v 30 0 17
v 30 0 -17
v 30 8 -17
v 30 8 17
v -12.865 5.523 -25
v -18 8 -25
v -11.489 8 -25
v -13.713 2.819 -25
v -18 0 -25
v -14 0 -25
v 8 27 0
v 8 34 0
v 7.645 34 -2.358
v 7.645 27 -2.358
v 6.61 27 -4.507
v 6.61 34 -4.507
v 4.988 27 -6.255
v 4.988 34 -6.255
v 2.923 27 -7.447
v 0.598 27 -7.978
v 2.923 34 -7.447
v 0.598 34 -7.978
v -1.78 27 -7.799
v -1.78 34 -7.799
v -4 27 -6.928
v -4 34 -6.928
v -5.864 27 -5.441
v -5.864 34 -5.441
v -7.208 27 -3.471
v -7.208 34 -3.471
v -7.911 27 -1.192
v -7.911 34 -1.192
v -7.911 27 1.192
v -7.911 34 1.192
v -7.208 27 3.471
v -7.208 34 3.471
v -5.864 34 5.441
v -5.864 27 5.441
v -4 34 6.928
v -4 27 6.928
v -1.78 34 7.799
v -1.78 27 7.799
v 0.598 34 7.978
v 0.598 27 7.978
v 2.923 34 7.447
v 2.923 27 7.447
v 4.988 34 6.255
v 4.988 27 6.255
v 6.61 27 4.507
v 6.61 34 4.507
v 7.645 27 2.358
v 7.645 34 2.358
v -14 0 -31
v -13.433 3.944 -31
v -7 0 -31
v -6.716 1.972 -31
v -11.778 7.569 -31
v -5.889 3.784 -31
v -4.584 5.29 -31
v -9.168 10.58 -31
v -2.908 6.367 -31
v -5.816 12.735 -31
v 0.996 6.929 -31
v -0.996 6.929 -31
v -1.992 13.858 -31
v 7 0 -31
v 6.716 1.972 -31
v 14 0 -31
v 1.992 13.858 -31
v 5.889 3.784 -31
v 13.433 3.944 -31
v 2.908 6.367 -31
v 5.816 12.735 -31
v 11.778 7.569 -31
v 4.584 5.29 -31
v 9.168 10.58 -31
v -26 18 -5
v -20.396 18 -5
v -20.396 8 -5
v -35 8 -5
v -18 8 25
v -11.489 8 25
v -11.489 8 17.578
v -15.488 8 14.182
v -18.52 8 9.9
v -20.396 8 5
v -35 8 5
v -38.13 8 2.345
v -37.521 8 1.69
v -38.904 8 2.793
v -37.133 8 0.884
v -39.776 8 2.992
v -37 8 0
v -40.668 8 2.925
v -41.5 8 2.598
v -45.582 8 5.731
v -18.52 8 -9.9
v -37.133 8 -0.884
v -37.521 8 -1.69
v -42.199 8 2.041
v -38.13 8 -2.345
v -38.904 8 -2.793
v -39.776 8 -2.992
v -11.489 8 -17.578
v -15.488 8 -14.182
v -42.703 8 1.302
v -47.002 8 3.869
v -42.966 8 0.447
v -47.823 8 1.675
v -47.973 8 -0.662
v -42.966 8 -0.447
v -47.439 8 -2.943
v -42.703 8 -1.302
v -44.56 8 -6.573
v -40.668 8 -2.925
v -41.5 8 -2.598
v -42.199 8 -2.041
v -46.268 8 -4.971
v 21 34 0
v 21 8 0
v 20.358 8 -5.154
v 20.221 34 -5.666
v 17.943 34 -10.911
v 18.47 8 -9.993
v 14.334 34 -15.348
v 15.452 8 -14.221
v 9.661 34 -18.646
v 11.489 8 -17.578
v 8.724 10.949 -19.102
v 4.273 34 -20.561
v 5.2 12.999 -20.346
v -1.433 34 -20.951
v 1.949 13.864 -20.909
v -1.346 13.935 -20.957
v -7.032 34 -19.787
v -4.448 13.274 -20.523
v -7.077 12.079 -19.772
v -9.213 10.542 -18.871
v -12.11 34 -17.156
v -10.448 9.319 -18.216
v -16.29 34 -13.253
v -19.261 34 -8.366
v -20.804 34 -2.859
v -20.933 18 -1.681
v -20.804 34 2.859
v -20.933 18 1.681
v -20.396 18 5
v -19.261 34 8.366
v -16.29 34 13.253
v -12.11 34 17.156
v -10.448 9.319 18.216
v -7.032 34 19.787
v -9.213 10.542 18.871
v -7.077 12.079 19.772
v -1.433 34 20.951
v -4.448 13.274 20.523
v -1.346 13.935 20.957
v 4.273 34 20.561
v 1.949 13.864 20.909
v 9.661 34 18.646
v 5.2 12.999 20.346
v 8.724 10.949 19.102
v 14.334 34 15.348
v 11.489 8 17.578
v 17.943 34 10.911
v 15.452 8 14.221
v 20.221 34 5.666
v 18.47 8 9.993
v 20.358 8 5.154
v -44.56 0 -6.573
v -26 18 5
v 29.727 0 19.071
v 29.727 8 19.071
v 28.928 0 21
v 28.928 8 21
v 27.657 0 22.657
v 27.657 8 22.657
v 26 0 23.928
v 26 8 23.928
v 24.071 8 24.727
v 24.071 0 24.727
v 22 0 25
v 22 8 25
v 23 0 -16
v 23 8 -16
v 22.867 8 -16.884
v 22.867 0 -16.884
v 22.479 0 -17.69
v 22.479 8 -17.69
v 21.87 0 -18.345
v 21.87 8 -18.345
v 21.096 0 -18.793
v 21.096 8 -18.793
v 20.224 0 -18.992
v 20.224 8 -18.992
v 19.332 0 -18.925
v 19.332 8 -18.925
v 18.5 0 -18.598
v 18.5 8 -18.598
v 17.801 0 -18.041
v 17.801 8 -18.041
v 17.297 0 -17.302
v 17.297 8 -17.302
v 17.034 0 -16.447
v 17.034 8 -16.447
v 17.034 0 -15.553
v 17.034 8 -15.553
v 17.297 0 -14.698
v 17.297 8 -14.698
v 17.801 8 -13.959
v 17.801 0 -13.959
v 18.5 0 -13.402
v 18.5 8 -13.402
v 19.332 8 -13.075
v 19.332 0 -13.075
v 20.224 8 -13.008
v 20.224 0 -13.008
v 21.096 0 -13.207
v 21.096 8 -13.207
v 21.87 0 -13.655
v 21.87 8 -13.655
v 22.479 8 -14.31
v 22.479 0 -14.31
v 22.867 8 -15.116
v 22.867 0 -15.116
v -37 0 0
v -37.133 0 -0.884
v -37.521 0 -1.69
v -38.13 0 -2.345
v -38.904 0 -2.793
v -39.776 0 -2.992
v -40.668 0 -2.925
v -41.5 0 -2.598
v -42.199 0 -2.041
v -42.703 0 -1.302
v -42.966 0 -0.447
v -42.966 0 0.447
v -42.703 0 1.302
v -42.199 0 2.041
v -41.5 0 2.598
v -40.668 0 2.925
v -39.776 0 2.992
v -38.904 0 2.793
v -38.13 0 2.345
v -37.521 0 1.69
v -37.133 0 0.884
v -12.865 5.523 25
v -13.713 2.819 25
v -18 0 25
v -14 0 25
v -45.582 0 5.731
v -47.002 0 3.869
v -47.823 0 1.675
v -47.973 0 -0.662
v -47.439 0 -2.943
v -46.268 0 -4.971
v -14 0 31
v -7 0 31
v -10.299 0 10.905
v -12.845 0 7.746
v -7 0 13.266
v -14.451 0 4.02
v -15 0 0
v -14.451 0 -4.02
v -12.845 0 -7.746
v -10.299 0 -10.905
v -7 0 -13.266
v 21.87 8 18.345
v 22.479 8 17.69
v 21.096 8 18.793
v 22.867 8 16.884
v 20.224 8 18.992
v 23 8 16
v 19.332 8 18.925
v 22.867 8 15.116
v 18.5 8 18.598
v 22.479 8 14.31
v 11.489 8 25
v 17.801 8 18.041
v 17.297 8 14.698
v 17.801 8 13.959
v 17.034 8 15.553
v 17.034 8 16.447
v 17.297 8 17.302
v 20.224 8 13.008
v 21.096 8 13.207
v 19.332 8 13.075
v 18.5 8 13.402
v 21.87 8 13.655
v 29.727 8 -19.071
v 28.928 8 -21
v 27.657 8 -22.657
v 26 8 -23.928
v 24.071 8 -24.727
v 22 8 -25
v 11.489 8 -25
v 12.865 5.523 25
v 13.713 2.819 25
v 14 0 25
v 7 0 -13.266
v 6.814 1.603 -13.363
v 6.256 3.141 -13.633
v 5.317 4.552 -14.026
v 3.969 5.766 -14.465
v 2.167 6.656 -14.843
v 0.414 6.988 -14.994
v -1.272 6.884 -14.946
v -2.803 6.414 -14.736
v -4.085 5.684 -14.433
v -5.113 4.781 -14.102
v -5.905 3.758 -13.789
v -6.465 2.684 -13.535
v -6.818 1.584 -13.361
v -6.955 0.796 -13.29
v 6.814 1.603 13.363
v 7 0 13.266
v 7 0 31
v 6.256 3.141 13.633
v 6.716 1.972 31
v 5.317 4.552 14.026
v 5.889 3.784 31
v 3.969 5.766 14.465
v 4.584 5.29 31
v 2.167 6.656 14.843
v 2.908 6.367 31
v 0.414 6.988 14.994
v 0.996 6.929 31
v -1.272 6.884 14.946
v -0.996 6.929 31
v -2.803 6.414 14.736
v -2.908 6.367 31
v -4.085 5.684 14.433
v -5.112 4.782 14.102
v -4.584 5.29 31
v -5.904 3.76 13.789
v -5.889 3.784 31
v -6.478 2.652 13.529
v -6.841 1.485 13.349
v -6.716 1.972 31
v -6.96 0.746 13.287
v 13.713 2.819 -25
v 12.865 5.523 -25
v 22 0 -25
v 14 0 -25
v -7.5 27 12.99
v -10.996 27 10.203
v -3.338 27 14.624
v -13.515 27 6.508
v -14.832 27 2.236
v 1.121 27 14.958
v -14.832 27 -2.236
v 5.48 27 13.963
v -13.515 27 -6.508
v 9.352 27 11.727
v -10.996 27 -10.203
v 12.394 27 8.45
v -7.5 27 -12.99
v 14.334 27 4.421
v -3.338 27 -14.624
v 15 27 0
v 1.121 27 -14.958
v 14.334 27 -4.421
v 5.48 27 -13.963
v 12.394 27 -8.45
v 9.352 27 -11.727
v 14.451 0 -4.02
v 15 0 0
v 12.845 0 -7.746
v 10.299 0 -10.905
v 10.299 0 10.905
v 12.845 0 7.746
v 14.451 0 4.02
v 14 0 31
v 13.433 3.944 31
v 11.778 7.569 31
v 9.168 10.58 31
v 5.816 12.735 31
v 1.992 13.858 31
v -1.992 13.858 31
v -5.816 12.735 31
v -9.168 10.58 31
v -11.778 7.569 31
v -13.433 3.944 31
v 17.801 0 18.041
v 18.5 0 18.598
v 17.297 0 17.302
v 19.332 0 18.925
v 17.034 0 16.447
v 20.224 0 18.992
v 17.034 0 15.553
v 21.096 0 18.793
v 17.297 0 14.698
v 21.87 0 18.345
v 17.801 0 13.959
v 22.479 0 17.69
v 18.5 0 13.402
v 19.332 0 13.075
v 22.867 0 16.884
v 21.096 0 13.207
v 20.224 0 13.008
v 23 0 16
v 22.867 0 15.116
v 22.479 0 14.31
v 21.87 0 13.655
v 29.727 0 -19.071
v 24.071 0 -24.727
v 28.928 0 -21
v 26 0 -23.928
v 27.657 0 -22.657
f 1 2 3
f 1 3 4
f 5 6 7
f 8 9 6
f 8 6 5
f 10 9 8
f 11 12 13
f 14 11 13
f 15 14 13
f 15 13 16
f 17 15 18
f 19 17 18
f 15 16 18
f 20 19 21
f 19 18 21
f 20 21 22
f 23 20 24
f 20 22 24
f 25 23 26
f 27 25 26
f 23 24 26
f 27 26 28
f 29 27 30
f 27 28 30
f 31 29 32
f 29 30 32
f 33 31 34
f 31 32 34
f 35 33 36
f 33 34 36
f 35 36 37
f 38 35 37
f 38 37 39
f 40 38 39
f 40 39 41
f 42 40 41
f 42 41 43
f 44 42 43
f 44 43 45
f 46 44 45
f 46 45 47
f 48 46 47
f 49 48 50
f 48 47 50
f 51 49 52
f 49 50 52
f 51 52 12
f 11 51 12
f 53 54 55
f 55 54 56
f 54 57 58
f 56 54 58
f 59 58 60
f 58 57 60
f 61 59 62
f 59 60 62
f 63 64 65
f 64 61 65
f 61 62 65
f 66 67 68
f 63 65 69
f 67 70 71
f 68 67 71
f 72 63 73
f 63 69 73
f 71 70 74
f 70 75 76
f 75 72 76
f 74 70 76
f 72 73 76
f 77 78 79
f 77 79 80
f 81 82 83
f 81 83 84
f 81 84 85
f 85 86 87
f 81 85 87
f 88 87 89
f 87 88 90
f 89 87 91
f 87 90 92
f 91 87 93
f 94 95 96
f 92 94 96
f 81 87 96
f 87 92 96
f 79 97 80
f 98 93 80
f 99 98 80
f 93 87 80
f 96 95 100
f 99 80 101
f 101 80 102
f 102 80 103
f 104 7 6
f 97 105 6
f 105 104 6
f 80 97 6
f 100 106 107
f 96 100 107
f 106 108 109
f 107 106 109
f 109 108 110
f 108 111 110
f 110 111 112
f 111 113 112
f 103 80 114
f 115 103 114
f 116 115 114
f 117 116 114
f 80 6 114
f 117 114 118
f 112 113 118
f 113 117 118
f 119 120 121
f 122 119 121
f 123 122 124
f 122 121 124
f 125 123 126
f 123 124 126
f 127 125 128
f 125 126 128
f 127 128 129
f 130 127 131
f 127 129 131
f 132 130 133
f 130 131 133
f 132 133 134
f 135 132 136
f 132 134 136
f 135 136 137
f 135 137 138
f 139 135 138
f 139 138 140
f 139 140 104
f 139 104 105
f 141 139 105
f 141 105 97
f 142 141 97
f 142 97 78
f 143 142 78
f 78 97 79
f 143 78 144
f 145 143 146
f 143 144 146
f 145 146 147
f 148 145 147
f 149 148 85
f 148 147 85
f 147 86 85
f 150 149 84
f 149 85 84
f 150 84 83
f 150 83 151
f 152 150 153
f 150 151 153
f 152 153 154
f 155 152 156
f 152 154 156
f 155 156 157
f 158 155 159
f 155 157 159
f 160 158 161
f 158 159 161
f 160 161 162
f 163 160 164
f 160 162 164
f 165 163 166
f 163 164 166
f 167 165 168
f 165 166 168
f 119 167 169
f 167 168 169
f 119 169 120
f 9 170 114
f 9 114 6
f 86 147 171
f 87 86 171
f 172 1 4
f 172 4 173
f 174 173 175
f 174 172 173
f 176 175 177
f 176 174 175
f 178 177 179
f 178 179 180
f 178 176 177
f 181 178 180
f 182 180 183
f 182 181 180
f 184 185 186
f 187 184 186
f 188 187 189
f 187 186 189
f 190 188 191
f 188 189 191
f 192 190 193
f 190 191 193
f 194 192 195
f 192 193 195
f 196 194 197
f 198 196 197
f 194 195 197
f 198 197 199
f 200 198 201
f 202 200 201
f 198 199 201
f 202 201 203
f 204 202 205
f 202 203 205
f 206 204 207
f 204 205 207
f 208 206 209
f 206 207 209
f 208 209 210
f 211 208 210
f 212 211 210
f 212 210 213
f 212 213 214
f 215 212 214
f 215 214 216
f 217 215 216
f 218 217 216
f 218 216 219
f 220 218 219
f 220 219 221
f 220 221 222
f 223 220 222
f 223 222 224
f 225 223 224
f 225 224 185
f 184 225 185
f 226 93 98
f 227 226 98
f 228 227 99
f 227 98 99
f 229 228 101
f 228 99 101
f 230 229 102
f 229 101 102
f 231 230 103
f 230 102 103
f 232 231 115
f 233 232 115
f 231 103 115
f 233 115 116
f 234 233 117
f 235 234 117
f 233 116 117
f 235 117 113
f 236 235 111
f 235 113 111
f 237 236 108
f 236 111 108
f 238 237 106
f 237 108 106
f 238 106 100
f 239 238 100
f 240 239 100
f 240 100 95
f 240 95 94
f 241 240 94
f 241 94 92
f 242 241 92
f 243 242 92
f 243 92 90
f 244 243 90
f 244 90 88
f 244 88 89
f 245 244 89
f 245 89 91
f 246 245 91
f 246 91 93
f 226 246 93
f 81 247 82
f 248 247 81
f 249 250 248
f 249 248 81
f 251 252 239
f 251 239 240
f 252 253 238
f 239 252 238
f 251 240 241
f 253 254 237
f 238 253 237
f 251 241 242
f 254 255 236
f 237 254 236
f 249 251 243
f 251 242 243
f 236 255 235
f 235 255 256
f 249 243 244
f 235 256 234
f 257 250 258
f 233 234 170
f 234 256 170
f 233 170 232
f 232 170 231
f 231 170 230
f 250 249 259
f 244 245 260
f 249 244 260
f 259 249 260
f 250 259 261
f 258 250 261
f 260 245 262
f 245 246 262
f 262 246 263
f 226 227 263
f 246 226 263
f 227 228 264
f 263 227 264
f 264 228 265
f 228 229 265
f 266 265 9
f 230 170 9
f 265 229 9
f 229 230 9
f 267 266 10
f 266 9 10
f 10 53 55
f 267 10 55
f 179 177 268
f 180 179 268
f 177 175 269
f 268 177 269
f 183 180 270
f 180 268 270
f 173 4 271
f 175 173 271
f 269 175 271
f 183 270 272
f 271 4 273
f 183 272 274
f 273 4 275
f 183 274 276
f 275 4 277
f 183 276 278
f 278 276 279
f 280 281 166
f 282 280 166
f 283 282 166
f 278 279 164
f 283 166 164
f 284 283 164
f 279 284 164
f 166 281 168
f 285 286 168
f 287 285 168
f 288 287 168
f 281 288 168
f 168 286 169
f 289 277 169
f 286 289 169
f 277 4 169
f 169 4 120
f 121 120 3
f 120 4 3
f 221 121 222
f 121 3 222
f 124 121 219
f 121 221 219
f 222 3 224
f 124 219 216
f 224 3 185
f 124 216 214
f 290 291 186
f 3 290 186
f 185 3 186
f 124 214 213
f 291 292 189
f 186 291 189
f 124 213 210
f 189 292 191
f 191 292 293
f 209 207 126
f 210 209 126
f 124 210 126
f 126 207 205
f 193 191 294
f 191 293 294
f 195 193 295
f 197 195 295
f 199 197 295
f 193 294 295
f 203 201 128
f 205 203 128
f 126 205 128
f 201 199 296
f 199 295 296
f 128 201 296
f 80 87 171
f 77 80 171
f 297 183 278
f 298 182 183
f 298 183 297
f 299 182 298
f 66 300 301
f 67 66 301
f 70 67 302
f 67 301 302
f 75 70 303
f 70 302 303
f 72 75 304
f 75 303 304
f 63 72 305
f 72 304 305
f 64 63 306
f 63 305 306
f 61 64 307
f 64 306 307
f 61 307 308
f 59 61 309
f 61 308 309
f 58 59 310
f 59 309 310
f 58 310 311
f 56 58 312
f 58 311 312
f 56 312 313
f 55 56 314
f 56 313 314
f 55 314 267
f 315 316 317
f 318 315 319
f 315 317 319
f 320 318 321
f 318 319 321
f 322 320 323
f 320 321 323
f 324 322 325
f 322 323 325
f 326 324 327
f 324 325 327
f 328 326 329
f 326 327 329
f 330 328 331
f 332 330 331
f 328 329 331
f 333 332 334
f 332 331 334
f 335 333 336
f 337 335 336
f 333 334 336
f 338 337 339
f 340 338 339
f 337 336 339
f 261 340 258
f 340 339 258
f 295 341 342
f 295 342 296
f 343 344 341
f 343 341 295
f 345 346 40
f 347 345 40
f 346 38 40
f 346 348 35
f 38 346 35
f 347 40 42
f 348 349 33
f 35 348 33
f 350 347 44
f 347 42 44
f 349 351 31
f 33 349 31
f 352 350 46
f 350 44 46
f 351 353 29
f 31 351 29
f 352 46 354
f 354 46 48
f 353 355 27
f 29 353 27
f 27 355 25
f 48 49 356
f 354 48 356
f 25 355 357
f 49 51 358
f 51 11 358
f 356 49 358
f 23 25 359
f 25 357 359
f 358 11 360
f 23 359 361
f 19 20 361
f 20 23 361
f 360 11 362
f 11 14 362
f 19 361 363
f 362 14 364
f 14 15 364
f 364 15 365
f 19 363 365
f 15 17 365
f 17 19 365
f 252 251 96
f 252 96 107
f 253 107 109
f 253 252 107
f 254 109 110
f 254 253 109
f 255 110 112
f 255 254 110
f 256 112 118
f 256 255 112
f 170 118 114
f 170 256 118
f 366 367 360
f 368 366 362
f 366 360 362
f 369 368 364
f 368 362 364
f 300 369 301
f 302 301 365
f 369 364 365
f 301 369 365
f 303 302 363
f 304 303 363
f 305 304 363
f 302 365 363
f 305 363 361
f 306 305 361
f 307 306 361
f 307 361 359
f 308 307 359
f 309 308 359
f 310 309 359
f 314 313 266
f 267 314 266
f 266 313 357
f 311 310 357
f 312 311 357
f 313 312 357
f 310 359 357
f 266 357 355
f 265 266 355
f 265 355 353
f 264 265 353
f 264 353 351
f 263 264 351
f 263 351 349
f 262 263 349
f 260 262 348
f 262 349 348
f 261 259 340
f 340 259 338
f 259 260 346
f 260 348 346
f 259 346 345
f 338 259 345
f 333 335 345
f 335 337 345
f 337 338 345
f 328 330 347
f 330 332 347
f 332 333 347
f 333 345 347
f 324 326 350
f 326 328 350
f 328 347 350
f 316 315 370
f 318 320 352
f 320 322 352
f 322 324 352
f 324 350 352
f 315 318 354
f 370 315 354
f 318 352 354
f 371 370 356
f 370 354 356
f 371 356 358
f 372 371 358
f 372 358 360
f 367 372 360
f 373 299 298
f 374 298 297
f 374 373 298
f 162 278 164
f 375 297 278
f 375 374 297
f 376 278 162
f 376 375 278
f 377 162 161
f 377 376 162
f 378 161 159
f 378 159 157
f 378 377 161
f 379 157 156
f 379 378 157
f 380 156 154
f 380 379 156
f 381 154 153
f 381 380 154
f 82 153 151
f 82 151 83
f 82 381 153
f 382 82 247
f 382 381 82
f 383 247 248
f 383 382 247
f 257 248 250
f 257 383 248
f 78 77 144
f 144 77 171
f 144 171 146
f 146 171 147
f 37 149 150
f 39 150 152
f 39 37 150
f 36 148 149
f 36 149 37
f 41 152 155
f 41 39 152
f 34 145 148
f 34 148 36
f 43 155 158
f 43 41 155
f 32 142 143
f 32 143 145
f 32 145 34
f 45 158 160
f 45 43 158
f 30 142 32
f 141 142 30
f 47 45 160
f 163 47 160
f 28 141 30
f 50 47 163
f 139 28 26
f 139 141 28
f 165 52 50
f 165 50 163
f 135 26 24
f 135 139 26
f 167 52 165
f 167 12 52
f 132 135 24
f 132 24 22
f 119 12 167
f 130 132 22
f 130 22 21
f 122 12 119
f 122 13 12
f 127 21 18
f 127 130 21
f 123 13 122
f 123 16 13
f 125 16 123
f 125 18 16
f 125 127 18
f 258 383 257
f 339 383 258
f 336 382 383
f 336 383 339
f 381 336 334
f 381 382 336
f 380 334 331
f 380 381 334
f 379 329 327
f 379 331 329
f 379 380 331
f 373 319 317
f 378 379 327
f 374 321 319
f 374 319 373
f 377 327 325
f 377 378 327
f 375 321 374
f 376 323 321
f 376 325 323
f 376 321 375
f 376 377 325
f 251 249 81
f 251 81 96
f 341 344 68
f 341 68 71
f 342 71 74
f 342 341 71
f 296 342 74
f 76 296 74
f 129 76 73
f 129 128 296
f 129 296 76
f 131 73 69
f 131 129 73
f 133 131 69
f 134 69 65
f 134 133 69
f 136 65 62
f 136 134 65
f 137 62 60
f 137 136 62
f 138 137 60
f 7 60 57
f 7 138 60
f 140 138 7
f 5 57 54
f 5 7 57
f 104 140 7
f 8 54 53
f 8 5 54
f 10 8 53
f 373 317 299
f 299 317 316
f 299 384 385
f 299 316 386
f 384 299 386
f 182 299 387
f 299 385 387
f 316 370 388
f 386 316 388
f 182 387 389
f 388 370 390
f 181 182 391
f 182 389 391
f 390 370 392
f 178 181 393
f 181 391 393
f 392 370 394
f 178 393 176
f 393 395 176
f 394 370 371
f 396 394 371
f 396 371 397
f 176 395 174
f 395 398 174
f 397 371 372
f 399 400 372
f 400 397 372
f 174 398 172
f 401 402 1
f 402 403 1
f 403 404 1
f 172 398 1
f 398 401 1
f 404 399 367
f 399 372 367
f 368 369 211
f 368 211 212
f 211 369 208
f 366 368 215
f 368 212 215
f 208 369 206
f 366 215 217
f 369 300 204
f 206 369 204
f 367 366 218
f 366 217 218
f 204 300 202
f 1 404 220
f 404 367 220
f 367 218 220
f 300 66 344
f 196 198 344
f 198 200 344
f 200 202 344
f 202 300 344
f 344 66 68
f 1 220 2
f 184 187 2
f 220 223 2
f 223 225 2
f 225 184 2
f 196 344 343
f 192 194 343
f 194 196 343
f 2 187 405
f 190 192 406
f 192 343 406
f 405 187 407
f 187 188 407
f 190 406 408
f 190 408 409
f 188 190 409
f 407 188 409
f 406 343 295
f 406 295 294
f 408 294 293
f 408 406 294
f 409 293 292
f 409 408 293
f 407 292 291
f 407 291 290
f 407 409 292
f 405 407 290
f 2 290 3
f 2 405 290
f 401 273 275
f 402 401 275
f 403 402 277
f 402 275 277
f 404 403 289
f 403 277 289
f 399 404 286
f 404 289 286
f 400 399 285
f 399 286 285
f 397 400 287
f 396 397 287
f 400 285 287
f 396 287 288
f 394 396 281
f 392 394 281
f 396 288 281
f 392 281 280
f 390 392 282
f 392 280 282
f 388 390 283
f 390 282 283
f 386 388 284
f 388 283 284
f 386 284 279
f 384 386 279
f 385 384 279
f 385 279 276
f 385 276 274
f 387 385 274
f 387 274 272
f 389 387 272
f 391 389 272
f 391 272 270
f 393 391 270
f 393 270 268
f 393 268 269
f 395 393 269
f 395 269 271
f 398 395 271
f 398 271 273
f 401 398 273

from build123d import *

# Parameters (mm, degrees)
EXTRUDE_1_DEPTH      = 31
EXTRUDE_1_DEPTH_BACK = 31
SKETCH_2_R           = 21
EXTRUDE_2_DEPTH      = 34
EXTRUDE_3_DEPTH      = 8
EXTRUDE_4_DEPTH      = 8
EXTRUDE_5_DEPTH      = 5
EXTRUDE_5_DEPTH_BACK = 5
SKETCH_6_R           = 8
CUT_EXTRUDE_1_DEPTH  = 7
SKETCH_7_R           = 15
CUT_EXTRUDE_2_DEPTH  = 64.198101329
SKETCH_8_R           = 7
CUT_EXTRUDE_3_DEPTH  = 86.463442589
SKETCH_9_R           = 3
CUT_EXTRUDE_4_DEPTH  = 63.777384554


with BuildPart() as part:
    # 草图1 → 凸台-拉伸1 (new, two sides: drawn at the far end of the back side and taken through both)
    with BuildSketch(Plane.XY.offset(-EXTRUDE_1_DEPTH_BACK)):
        with BuildLine():
            Line((-14, 0), (14, 0))
            ThreePointArc((14, 0), (0, 14), (-14, 0))
        make_face()
    extrude(amount=EXTRUDE_1_DEPTH + EXTRUDE_1_DEPTH_BACK)

    # 草图2 → 凸台-拉伸2 (add)
    with BuildSketch(Plane(origin=(0, 0, 0), x_dir=(1, 0, 0), z_dir=(0, 1, 0))):
        Circle(SKETCH_2_R)
    extrude(amount=EXTRUDE_2_DEPTH)

    # 草图3 → 凸台-拉伸3 (add)
    with BuildSketch(Plane(origin=(0, 0, 0), x_dir=(1, 0, 0), z_dir=(0, 1, 0))):
        with BuildLine():
            Line((0, 25), (0, -25))
            Line((0, -25), (-18, -25))
            Line((-18, -25), (-45.582150825, -5.730583929))
            ThreePointArc((-45.582150825, -5.730583929), (-47.97254676, 0.662191934), (-44.560227187, 6.572999924))
            Line((-44.560227187, 6.572999924), (-18, 25))
            Line((-18, 25), (0, 25))
        make_face()
    extrude(amount=EXTRUDE_3_DEPTH)

    # 草图4 → 凸台-拉伸4 (add)
    with BuildSketch(Plane(origin=(0, 0, 0), x_dir=(1, 0, 0), z_dir=(0, 1, 0))):
        with BuildLine():
            Line((0, -25), (0, 25))
            Line((0, 25), (22, 25))
            ThreePointArc((22, 25), (27.656854249, 22.656854249), (30, 17))
            Line((30, 17), (30, -17))
            ThreePointArc((30, -17), (27.656854249, -22.656854249), (22, -25))
            Line((22, -25), (0, -25))
        make_face()
    extrude(amount=EXTRUDE_4_DEPTH)

    # 草图5 → 凸台-拉伸5 (add, two sides: drawn at the far end of the back side and taken through both)
    with BuildSketch(Plane.XY.offset(-EXTRUDE_5_DEPTH_BACK)):
        Polygon((-16.636065675, 8), (-35, 8), (-26, 18), (-16.636065675, 18), align=None)
    extrude(amount=EXTRUDE_5_DEPTH + EXTRUDE_5_DEPTH_BACK)

    # 草图6 → 切除-拉伸1 (cut)
    with BuildSketch(Plane(origin=(0, 34, 0), x_dir=(1, 0, 0), z_dir=(0, 1, 0))):
        Circle(SKETCH_6_R)
    extrude(amount=-CUT_EXTRUDE_1_DEPTH, mode=Mode.SUBTRACT)

    # 草图7 → 切除-拉伸2 (cut, through all)
    with BuildSketch(Plane(origin=(0, 27, 0), x_dir=(1, 0, 0), z_dir=(0, 1, 0))):
        Circle(SKETCH_7_R)
    extrude(amount=-CUT_EXTRUDE_2_DEPTH, mode=Mode.SUBTRACT)

    # 草图8 → 切除-拉伸3 (cut, through all)
    with BuildSketch(Plane.XY.offset(31)):
        Circle(SKETCH_8_R)
    extrude(amount=-CUT_EXTRUDE_3_DEPTH, mode=Mode.SUBTRACT)

    # 草图9 → 切除-拉伸4 (cut, through all)
    with BuildSketch(Plane(origin=(0, 8, 0), x_dir=(1, 0, 0), z_dir=(0, 1, 0))):
        with Locations((-40, 0)):
            Circle(SKETCH_9_R)
        with Locations((20, 16)):
            Circle(SKETCH_9_R)
        with Locations((20, -16)):
            Circle(SKETCH_9_R)
    extrude(amount=-CUT_EXTRUDE_4_DEPTH, mode=Mode.SUBTRACT)


solid = part.part
